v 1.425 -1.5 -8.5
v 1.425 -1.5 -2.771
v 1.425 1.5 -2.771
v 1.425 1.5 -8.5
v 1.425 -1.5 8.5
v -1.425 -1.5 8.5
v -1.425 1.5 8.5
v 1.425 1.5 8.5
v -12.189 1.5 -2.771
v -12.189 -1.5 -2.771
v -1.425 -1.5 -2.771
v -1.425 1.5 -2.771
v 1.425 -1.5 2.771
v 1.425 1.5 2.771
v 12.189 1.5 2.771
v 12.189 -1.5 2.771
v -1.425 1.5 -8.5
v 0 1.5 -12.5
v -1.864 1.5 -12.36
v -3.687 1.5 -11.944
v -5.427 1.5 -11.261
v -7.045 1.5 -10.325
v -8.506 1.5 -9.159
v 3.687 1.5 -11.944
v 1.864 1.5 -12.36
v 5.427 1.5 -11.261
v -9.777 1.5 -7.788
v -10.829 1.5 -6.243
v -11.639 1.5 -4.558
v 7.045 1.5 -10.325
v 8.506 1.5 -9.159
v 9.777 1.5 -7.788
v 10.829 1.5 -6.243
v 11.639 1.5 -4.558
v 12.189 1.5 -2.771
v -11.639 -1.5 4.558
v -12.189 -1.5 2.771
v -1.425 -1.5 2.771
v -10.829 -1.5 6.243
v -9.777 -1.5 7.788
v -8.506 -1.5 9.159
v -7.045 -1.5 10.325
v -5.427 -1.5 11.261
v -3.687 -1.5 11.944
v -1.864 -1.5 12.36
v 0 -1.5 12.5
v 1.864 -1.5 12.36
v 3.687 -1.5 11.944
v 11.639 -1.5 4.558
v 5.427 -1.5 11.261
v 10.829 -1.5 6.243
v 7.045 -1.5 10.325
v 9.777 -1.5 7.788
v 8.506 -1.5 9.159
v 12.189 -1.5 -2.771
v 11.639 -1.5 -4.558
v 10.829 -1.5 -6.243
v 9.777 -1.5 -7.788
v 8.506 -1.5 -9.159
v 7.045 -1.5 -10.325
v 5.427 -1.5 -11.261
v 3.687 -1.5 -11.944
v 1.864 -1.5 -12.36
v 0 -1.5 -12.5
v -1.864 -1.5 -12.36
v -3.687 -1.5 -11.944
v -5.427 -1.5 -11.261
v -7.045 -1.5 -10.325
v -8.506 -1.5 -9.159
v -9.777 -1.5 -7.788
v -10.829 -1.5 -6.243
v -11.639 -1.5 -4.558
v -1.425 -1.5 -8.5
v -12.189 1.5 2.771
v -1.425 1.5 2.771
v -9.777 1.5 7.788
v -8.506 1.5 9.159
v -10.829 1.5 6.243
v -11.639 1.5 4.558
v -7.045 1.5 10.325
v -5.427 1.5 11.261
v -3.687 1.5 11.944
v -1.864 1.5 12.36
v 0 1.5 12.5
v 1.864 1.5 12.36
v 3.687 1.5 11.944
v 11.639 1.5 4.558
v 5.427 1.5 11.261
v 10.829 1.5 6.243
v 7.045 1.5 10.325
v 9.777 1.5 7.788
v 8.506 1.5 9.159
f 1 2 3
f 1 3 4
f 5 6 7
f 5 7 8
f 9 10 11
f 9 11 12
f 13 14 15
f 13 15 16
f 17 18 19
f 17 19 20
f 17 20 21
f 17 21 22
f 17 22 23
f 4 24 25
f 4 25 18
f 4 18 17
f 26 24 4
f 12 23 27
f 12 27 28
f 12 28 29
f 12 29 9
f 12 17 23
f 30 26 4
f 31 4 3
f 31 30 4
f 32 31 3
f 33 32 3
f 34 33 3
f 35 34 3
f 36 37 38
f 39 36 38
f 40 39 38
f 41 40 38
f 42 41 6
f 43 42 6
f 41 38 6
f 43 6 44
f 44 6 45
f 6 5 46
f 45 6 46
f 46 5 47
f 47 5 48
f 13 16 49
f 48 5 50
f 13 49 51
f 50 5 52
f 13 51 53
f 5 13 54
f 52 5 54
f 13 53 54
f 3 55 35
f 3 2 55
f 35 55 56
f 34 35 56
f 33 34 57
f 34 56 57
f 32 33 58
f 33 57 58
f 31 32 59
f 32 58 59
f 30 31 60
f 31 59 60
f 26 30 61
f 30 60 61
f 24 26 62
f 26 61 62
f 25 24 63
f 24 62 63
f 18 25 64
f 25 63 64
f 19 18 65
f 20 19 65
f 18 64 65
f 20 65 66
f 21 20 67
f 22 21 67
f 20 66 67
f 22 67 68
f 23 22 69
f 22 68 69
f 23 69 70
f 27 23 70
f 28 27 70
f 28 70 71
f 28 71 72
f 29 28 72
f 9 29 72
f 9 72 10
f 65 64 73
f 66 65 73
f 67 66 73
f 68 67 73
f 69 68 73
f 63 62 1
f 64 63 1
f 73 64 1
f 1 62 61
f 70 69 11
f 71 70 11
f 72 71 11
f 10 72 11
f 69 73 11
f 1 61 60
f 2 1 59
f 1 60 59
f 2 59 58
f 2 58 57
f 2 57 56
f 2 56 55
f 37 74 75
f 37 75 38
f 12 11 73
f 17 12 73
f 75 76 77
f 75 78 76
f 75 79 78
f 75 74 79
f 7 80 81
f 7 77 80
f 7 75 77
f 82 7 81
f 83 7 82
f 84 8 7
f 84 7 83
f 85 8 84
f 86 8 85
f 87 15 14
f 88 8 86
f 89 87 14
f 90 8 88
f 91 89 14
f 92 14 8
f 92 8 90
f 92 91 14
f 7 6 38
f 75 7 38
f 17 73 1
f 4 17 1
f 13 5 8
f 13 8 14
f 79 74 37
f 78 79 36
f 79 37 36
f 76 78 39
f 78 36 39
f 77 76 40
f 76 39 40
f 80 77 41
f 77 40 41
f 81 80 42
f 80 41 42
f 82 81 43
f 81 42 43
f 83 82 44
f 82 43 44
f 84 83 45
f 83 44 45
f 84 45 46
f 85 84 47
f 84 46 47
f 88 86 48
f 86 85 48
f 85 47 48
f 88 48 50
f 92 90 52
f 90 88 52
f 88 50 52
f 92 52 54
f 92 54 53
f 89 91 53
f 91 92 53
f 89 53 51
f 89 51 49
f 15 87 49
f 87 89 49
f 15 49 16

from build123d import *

# Parameters (mm, degrees)
BOSS_EXTRUDE1_DEPTH      = 1.5
BOSS_EXTRUDE1_DEPTH_BACK = 1.5
SKETCH1_R                = 12.5
SKETCH1_W                = 2.85
SKETCH1_H                = 17
CUT_EXTRUDE1_DEPTH       = 18.741194999
CUT_EXTRUDE1_DEPTH_BACK  = 18.741194999


with BuildPart() as part:
    # Sketch1 → Boss-Extrude1 (new, two sides: drawn at the far end of the back side and taken through both)
    with BuildSketch(Plane(origin=(0, 0, 0), x_dir=(1, 0, 0), z_dir=(0, 1, 0)).offset(-BOSS_EXTRUDE1_DEPTH_BACK)):
        Circle(SKETCH1_R)
        Rectangle(SKETCH1_W, SKETCH1_H, mode=Mode.SUBTRACT)
    extrude(amount=BOSS_EXTRUDE1_DEPTH + BOSS_EXTRUDE1_DEPTH_BACK)

    # Sketch4 → Cut-Extrude1 (cut, two sides: drawn at the far end of the back side and taken through both)
    with BuildSketch(Plane(origin=(0, 0, 0), x_dir=(0, 0, -1), z_dir=(1, 0, 0)).offset(-CUT_EXTRUDE1_DEPTH_BACK)):
        Polygon((2.771281292, -1.6), (2.771281292, 1.6), (0, 3.2), (-2.771281292, 1.6), (-2.771281292, -1.6), (0, -3.2), align=None)
    extrude(amount=CUT_EXTRUDE1_DEPTH + CUT_EXTRUDE1_DEPTH_BACK, mode=Mode.SUBTRACT)


with BuildPart() as cut_extrude1_piece_1:
    # of the separate pieces the step leaves, piece 1, a body of its own (cut_extrude1_pieces)
    add(part.part.solids().sort_by_distance((-12.188929403, -1.5, -2.771281292))[0])


with BuildPart() as cut_extrude1_piece_2:
    # of the separate pieces the step leaves, piece 2, a body of its own (cut_extrude1_pieces)
    add(part.part.solids().sort_by_distance((-12.188929403, 1.5, 2.771281292))[0])


solid = Compound([cut_extrude1_piece_1.part, cut_extrude1_piece_2.part])
